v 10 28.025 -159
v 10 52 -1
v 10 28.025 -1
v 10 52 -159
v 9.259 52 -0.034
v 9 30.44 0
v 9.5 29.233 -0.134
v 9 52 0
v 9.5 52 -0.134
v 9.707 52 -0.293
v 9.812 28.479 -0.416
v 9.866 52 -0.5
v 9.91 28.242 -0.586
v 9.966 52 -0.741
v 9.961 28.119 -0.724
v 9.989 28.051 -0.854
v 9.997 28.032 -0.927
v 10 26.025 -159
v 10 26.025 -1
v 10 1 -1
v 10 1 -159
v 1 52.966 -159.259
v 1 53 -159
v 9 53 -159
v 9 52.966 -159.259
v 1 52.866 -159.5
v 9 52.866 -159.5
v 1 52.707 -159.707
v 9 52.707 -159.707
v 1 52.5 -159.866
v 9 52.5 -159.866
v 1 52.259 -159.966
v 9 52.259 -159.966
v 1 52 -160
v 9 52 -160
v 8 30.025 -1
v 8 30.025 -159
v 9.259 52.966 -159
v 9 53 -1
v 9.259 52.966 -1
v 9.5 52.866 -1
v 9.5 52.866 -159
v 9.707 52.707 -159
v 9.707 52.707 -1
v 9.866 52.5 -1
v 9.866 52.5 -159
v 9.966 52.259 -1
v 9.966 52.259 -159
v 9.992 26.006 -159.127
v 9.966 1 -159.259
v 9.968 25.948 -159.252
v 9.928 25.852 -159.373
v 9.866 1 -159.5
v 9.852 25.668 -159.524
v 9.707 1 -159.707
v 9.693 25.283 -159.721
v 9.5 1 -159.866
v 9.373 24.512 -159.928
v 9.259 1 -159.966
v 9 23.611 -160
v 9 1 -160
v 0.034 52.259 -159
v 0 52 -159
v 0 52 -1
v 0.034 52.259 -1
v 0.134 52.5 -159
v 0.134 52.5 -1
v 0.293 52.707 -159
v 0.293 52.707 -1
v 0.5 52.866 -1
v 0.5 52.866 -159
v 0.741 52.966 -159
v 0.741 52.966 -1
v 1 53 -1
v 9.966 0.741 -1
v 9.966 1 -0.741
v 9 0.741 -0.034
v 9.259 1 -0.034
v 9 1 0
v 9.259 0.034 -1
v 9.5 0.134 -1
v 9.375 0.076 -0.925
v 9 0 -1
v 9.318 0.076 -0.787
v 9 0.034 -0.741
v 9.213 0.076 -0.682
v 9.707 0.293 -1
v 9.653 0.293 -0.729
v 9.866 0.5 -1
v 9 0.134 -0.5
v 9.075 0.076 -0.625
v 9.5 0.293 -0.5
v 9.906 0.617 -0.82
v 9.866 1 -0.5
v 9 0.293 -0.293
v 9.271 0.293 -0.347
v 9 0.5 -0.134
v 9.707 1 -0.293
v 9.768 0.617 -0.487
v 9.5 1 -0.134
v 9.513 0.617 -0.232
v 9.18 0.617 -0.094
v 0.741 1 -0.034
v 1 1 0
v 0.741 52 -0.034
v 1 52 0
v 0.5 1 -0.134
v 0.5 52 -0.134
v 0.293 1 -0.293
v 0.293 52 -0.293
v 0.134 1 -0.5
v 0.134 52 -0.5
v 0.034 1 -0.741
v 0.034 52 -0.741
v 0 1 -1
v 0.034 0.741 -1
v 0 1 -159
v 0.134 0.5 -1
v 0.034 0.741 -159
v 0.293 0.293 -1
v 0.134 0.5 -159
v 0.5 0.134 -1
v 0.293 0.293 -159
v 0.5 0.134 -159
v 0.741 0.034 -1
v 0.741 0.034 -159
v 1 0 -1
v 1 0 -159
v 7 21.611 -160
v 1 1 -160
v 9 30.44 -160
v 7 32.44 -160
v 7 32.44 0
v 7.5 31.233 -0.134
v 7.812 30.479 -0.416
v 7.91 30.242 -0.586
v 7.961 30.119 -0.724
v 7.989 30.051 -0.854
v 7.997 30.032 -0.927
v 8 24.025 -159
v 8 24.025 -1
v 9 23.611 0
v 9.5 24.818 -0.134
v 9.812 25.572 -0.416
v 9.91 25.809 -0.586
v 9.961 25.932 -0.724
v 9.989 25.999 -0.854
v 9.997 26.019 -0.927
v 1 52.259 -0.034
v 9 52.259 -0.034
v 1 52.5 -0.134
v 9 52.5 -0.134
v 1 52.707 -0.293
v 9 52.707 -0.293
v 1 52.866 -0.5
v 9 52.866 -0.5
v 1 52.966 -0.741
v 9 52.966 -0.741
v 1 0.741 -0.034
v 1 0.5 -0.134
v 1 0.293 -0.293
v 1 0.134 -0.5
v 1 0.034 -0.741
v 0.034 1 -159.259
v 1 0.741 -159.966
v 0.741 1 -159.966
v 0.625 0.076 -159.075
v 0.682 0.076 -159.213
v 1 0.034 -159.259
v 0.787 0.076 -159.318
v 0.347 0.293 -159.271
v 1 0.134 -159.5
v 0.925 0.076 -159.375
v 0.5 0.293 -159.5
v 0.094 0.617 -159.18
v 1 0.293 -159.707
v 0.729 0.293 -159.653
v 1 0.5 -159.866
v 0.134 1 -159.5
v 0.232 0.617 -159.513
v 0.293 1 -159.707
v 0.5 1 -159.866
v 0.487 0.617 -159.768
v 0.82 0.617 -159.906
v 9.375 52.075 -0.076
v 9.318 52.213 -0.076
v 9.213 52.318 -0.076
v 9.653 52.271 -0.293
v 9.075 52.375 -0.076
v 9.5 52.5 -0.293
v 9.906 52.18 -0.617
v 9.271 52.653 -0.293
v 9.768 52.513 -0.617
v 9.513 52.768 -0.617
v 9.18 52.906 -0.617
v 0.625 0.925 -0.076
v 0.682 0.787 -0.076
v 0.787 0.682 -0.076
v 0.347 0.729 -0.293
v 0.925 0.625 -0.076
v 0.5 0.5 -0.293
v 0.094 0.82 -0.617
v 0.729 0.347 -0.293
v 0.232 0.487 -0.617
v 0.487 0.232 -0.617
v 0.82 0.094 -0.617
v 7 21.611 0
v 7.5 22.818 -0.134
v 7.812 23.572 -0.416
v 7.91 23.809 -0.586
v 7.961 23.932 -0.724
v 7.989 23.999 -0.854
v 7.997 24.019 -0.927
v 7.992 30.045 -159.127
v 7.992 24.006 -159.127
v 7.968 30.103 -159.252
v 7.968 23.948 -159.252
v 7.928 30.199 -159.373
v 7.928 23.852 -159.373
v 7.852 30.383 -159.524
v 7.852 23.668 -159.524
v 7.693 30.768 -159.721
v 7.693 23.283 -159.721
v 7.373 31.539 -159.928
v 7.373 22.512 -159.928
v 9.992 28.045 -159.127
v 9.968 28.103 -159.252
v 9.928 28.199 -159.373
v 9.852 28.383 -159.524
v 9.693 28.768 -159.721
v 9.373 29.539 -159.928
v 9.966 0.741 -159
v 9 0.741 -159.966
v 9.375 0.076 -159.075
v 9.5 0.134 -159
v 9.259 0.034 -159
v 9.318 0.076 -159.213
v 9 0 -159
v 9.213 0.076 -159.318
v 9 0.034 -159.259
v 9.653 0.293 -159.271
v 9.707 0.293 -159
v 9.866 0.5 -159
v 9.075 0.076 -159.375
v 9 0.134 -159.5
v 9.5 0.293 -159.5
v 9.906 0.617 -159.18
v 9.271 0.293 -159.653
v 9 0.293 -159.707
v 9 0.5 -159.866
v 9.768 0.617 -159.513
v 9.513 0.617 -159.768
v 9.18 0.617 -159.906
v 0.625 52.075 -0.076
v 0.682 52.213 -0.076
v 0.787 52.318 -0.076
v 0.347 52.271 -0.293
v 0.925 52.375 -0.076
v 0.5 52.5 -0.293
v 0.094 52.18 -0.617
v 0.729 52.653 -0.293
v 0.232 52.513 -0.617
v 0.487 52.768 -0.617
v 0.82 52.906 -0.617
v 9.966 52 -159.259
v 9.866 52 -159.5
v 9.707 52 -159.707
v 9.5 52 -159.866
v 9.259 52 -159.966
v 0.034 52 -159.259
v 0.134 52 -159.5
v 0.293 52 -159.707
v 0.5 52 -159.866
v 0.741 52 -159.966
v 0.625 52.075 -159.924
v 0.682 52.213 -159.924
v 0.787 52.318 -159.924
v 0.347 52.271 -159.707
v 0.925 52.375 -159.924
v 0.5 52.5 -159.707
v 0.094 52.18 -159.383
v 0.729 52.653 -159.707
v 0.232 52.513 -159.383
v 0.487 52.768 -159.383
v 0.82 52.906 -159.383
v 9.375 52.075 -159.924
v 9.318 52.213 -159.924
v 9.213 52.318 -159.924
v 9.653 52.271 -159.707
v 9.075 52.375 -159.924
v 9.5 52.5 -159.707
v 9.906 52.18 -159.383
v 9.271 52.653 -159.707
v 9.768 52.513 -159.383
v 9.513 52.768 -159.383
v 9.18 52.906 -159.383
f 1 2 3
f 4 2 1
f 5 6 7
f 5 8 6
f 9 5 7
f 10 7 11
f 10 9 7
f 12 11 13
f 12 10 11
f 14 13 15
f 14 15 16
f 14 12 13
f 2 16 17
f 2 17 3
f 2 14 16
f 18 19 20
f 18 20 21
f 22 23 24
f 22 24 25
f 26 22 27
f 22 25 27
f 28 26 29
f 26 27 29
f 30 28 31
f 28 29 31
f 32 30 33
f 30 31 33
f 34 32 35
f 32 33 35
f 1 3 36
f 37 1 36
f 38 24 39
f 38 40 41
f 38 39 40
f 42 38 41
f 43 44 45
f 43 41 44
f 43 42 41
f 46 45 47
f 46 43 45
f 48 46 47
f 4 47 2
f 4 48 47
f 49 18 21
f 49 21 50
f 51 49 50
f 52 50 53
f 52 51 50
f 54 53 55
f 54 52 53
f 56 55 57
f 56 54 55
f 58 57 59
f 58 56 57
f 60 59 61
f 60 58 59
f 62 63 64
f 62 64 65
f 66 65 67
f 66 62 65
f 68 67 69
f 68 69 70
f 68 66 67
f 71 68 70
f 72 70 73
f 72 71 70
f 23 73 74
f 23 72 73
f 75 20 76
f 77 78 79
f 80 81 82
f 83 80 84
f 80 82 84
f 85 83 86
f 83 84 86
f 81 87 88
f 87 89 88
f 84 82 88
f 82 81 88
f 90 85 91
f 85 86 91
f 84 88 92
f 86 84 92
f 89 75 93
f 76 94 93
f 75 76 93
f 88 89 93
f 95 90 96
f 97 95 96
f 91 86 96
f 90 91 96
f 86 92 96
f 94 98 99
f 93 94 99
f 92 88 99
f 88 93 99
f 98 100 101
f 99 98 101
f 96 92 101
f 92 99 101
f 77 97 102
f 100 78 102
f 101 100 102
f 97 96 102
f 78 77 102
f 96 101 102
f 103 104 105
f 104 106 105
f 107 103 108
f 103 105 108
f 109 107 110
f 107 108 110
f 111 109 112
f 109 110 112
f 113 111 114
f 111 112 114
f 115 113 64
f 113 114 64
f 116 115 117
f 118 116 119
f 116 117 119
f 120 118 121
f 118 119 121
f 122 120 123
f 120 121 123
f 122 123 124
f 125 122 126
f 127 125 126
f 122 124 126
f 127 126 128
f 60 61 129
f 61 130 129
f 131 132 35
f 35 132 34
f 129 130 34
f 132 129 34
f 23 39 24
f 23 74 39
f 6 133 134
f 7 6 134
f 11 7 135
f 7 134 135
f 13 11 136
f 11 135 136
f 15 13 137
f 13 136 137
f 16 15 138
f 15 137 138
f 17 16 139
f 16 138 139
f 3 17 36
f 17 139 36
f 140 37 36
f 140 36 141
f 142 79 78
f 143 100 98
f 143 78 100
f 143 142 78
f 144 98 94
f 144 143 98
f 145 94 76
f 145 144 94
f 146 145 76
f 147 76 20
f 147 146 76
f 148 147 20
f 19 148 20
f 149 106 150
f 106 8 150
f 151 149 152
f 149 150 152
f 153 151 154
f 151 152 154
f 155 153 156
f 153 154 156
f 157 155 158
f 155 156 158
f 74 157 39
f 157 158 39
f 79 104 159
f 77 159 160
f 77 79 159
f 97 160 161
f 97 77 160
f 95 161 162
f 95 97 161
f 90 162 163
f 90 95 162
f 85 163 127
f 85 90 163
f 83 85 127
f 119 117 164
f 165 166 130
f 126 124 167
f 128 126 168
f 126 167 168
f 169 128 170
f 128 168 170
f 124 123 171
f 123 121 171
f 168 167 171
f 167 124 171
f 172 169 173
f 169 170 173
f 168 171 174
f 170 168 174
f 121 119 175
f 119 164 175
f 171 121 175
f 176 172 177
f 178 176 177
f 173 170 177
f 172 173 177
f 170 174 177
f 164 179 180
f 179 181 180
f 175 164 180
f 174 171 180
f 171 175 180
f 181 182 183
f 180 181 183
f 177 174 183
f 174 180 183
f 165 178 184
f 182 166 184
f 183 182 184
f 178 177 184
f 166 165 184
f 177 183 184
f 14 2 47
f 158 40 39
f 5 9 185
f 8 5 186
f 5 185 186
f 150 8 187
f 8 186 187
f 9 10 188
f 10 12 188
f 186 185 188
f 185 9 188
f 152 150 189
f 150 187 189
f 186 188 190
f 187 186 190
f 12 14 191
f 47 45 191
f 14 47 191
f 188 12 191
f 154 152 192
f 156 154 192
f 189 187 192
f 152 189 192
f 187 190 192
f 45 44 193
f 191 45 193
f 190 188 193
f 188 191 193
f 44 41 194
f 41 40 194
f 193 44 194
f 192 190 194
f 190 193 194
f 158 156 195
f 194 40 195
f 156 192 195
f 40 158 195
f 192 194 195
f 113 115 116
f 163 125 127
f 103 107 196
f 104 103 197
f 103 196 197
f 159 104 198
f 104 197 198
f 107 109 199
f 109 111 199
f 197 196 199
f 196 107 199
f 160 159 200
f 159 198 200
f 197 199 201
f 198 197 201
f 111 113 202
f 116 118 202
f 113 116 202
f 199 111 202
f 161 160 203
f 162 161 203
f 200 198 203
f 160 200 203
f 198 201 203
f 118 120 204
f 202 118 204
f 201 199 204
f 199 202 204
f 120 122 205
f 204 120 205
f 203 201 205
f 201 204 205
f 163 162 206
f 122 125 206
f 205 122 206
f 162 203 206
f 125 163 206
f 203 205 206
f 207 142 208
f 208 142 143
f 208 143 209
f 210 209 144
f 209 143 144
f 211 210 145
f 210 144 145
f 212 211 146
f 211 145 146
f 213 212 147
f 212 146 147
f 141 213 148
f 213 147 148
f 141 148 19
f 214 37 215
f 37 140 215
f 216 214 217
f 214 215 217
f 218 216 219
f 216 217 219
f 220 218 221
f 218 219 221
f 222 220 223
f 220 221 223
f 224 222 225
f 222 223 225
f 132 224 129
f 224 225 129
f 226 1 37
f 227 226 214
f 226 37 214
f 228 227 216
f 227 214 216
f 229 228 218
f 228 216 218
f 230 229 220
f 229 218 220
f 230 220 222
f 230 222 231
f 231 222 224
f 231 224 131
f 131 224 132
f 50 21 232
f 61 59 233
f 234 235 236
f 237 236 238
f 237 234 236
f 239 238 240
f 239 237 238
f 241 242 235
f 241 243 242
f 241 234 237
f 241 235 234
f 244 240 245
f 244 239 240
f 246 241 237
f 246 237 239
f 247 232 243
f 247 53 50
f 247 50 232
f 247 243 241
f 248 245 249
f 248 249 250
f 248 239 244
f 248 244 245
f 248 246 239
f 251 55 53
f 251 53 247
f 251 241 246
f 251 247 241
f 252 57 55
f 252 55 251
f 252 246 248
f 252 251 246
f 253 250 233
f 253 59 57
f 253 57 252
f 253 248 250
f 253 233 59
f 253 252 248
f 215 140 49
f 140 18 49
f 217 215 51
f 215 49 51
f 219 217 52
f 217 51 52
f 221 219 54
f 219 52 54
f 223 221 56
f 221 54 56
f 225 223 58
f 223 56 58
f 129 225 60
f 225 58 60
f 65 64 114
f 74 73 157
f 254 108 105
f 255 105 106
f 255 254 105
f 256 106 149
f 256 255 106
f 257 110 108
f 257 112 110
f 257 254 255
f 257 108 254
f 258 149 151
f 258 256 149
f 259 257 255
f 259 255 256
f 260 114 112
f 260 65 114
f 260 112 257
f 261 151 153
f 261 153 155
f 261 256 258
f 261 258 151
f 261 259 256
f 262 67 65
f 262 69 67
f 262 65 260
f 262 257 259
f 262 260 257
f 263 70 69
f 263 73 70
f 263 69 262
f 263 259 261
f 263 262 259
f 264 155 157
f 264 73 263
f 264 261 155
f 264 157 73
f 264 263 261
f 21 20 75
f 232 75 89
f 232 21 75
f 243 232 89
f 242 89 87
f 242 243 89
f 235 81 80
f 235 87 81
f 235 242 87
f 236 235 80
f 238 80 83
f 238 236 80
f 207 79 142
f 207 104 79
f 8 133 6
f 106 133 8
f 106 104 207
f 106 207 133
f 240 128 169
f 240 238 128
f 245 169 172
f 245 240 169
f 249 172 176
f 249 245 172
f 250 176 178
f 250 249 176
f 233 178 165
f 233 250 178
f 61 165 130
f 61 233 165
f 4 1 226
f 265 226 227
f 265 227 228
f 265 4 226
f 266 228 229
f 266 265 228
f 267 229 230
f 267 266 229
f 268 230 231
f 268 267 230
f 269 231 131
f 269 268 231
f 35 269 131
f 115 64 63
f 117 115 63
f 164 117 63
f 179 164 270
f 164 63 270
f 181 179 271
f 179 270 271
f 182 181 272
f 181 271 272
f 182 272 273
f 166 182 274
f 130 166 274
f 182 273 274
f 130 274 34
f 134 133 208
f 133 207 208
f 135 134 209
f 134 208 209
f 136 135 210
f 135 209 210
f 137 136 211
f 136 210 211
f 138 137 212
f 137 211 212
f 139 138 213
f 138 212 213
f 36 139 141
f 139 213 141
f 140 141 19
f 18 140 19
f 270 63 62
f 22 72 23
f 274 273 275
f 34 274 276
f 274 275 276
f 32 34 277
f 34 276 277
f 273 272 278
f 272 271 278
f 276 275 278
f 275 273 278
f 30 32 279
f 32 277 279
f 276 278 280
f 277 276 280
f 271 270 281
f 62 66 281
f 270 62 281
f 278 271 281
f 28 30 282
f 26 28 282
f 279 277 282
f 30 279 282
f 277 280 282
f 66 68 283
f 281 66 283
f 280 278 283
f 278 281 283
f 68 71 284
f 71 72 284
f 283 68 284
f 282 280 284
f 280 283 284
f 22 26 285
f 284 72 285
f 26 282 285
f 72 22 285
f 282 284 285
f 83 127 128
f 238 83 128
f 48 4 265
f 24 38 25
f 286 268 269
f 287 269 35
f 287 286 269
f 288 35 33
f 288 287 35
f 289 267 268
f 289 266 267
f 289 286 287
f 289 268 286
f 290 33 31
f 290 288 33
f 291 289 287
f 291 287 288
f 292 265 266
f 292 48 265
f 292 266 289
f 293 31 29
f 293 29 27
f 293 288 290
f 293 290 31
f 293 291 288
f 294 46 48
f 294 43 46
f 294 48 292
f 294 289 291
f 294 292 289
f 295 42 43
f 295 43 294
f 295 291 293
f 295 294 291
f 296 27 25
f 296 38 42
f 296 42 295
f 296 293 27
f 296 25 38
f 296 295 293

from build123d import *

# Parameters (mm, degrees)
SKETCH1_W           = 160
SKETCH1_H           = 53
BOSS_EXTRUDE1_DEPTH = 10
CUT_EXTRUDE2_START  = -160
CUT_EXTRUDE2_DEPTH  = 160
FILLET1_R           = 1


# Read off the part's stored shape, not the designer's step: Cut-Extrude2
with BuildPart() as part:
    # Sketch1 → Boss-Extrude1 (new body)
    with BuildSketch(Plane(origin=(0, 0, 0), x_dir=(0, 0, -1), z_dir=(1, 0, 0))):
        with Locations((80, 26.5)):
            Rectangle(SKETCH1_W, SKETCH1_H)
    extrude(amount=BOSS_EXTRUDE1_DEPTH)

    # Cut-Extrude2 outline → Cut-Extrude2 (cut)
    with BuildSketch(Plane.XY.offset(CUT_EXTRUDE2_START)):
        Polygon((10, 28.025442771), (8, 30.025442771), (8, 24.025442771), (10, 26.025442771), align=None)
    extrude(amount=CUT_EXTRUDE2_DEPTH, mode=Mode.SUBTRACT)

    # Fillet1
    fillet1_edges = [part.edges().sort_by_distance(p)[0] for p in [
        (10, 13.012721386, -160),
        (10, 53, -80),
        (10, 13.012721386, 0),
        (10, 40.512721386, -160),
        (8, 27.025442771, -160),
        (8, 27.025442771, 0),
        (9, 25.025442771, 0),
        (9, 29.025442771, 0),
        (9, 25.025442771, -160),
        (9, 29.025442771, -160),
        (10, 40.512721386, 0),
        (0, 53, -80),
        (0, 26.5, -160),
        (0, 0, -80),
        (0, 26.5, 0),
        (10, 0, -80),
        (5, 53, 0),
        (5, 53, -160),
        (5, 0, -160),
        (5, 0, 0),
    ]]
    fillet(fillet1_edges, radius=FILLET1_R)


solid = part.part
